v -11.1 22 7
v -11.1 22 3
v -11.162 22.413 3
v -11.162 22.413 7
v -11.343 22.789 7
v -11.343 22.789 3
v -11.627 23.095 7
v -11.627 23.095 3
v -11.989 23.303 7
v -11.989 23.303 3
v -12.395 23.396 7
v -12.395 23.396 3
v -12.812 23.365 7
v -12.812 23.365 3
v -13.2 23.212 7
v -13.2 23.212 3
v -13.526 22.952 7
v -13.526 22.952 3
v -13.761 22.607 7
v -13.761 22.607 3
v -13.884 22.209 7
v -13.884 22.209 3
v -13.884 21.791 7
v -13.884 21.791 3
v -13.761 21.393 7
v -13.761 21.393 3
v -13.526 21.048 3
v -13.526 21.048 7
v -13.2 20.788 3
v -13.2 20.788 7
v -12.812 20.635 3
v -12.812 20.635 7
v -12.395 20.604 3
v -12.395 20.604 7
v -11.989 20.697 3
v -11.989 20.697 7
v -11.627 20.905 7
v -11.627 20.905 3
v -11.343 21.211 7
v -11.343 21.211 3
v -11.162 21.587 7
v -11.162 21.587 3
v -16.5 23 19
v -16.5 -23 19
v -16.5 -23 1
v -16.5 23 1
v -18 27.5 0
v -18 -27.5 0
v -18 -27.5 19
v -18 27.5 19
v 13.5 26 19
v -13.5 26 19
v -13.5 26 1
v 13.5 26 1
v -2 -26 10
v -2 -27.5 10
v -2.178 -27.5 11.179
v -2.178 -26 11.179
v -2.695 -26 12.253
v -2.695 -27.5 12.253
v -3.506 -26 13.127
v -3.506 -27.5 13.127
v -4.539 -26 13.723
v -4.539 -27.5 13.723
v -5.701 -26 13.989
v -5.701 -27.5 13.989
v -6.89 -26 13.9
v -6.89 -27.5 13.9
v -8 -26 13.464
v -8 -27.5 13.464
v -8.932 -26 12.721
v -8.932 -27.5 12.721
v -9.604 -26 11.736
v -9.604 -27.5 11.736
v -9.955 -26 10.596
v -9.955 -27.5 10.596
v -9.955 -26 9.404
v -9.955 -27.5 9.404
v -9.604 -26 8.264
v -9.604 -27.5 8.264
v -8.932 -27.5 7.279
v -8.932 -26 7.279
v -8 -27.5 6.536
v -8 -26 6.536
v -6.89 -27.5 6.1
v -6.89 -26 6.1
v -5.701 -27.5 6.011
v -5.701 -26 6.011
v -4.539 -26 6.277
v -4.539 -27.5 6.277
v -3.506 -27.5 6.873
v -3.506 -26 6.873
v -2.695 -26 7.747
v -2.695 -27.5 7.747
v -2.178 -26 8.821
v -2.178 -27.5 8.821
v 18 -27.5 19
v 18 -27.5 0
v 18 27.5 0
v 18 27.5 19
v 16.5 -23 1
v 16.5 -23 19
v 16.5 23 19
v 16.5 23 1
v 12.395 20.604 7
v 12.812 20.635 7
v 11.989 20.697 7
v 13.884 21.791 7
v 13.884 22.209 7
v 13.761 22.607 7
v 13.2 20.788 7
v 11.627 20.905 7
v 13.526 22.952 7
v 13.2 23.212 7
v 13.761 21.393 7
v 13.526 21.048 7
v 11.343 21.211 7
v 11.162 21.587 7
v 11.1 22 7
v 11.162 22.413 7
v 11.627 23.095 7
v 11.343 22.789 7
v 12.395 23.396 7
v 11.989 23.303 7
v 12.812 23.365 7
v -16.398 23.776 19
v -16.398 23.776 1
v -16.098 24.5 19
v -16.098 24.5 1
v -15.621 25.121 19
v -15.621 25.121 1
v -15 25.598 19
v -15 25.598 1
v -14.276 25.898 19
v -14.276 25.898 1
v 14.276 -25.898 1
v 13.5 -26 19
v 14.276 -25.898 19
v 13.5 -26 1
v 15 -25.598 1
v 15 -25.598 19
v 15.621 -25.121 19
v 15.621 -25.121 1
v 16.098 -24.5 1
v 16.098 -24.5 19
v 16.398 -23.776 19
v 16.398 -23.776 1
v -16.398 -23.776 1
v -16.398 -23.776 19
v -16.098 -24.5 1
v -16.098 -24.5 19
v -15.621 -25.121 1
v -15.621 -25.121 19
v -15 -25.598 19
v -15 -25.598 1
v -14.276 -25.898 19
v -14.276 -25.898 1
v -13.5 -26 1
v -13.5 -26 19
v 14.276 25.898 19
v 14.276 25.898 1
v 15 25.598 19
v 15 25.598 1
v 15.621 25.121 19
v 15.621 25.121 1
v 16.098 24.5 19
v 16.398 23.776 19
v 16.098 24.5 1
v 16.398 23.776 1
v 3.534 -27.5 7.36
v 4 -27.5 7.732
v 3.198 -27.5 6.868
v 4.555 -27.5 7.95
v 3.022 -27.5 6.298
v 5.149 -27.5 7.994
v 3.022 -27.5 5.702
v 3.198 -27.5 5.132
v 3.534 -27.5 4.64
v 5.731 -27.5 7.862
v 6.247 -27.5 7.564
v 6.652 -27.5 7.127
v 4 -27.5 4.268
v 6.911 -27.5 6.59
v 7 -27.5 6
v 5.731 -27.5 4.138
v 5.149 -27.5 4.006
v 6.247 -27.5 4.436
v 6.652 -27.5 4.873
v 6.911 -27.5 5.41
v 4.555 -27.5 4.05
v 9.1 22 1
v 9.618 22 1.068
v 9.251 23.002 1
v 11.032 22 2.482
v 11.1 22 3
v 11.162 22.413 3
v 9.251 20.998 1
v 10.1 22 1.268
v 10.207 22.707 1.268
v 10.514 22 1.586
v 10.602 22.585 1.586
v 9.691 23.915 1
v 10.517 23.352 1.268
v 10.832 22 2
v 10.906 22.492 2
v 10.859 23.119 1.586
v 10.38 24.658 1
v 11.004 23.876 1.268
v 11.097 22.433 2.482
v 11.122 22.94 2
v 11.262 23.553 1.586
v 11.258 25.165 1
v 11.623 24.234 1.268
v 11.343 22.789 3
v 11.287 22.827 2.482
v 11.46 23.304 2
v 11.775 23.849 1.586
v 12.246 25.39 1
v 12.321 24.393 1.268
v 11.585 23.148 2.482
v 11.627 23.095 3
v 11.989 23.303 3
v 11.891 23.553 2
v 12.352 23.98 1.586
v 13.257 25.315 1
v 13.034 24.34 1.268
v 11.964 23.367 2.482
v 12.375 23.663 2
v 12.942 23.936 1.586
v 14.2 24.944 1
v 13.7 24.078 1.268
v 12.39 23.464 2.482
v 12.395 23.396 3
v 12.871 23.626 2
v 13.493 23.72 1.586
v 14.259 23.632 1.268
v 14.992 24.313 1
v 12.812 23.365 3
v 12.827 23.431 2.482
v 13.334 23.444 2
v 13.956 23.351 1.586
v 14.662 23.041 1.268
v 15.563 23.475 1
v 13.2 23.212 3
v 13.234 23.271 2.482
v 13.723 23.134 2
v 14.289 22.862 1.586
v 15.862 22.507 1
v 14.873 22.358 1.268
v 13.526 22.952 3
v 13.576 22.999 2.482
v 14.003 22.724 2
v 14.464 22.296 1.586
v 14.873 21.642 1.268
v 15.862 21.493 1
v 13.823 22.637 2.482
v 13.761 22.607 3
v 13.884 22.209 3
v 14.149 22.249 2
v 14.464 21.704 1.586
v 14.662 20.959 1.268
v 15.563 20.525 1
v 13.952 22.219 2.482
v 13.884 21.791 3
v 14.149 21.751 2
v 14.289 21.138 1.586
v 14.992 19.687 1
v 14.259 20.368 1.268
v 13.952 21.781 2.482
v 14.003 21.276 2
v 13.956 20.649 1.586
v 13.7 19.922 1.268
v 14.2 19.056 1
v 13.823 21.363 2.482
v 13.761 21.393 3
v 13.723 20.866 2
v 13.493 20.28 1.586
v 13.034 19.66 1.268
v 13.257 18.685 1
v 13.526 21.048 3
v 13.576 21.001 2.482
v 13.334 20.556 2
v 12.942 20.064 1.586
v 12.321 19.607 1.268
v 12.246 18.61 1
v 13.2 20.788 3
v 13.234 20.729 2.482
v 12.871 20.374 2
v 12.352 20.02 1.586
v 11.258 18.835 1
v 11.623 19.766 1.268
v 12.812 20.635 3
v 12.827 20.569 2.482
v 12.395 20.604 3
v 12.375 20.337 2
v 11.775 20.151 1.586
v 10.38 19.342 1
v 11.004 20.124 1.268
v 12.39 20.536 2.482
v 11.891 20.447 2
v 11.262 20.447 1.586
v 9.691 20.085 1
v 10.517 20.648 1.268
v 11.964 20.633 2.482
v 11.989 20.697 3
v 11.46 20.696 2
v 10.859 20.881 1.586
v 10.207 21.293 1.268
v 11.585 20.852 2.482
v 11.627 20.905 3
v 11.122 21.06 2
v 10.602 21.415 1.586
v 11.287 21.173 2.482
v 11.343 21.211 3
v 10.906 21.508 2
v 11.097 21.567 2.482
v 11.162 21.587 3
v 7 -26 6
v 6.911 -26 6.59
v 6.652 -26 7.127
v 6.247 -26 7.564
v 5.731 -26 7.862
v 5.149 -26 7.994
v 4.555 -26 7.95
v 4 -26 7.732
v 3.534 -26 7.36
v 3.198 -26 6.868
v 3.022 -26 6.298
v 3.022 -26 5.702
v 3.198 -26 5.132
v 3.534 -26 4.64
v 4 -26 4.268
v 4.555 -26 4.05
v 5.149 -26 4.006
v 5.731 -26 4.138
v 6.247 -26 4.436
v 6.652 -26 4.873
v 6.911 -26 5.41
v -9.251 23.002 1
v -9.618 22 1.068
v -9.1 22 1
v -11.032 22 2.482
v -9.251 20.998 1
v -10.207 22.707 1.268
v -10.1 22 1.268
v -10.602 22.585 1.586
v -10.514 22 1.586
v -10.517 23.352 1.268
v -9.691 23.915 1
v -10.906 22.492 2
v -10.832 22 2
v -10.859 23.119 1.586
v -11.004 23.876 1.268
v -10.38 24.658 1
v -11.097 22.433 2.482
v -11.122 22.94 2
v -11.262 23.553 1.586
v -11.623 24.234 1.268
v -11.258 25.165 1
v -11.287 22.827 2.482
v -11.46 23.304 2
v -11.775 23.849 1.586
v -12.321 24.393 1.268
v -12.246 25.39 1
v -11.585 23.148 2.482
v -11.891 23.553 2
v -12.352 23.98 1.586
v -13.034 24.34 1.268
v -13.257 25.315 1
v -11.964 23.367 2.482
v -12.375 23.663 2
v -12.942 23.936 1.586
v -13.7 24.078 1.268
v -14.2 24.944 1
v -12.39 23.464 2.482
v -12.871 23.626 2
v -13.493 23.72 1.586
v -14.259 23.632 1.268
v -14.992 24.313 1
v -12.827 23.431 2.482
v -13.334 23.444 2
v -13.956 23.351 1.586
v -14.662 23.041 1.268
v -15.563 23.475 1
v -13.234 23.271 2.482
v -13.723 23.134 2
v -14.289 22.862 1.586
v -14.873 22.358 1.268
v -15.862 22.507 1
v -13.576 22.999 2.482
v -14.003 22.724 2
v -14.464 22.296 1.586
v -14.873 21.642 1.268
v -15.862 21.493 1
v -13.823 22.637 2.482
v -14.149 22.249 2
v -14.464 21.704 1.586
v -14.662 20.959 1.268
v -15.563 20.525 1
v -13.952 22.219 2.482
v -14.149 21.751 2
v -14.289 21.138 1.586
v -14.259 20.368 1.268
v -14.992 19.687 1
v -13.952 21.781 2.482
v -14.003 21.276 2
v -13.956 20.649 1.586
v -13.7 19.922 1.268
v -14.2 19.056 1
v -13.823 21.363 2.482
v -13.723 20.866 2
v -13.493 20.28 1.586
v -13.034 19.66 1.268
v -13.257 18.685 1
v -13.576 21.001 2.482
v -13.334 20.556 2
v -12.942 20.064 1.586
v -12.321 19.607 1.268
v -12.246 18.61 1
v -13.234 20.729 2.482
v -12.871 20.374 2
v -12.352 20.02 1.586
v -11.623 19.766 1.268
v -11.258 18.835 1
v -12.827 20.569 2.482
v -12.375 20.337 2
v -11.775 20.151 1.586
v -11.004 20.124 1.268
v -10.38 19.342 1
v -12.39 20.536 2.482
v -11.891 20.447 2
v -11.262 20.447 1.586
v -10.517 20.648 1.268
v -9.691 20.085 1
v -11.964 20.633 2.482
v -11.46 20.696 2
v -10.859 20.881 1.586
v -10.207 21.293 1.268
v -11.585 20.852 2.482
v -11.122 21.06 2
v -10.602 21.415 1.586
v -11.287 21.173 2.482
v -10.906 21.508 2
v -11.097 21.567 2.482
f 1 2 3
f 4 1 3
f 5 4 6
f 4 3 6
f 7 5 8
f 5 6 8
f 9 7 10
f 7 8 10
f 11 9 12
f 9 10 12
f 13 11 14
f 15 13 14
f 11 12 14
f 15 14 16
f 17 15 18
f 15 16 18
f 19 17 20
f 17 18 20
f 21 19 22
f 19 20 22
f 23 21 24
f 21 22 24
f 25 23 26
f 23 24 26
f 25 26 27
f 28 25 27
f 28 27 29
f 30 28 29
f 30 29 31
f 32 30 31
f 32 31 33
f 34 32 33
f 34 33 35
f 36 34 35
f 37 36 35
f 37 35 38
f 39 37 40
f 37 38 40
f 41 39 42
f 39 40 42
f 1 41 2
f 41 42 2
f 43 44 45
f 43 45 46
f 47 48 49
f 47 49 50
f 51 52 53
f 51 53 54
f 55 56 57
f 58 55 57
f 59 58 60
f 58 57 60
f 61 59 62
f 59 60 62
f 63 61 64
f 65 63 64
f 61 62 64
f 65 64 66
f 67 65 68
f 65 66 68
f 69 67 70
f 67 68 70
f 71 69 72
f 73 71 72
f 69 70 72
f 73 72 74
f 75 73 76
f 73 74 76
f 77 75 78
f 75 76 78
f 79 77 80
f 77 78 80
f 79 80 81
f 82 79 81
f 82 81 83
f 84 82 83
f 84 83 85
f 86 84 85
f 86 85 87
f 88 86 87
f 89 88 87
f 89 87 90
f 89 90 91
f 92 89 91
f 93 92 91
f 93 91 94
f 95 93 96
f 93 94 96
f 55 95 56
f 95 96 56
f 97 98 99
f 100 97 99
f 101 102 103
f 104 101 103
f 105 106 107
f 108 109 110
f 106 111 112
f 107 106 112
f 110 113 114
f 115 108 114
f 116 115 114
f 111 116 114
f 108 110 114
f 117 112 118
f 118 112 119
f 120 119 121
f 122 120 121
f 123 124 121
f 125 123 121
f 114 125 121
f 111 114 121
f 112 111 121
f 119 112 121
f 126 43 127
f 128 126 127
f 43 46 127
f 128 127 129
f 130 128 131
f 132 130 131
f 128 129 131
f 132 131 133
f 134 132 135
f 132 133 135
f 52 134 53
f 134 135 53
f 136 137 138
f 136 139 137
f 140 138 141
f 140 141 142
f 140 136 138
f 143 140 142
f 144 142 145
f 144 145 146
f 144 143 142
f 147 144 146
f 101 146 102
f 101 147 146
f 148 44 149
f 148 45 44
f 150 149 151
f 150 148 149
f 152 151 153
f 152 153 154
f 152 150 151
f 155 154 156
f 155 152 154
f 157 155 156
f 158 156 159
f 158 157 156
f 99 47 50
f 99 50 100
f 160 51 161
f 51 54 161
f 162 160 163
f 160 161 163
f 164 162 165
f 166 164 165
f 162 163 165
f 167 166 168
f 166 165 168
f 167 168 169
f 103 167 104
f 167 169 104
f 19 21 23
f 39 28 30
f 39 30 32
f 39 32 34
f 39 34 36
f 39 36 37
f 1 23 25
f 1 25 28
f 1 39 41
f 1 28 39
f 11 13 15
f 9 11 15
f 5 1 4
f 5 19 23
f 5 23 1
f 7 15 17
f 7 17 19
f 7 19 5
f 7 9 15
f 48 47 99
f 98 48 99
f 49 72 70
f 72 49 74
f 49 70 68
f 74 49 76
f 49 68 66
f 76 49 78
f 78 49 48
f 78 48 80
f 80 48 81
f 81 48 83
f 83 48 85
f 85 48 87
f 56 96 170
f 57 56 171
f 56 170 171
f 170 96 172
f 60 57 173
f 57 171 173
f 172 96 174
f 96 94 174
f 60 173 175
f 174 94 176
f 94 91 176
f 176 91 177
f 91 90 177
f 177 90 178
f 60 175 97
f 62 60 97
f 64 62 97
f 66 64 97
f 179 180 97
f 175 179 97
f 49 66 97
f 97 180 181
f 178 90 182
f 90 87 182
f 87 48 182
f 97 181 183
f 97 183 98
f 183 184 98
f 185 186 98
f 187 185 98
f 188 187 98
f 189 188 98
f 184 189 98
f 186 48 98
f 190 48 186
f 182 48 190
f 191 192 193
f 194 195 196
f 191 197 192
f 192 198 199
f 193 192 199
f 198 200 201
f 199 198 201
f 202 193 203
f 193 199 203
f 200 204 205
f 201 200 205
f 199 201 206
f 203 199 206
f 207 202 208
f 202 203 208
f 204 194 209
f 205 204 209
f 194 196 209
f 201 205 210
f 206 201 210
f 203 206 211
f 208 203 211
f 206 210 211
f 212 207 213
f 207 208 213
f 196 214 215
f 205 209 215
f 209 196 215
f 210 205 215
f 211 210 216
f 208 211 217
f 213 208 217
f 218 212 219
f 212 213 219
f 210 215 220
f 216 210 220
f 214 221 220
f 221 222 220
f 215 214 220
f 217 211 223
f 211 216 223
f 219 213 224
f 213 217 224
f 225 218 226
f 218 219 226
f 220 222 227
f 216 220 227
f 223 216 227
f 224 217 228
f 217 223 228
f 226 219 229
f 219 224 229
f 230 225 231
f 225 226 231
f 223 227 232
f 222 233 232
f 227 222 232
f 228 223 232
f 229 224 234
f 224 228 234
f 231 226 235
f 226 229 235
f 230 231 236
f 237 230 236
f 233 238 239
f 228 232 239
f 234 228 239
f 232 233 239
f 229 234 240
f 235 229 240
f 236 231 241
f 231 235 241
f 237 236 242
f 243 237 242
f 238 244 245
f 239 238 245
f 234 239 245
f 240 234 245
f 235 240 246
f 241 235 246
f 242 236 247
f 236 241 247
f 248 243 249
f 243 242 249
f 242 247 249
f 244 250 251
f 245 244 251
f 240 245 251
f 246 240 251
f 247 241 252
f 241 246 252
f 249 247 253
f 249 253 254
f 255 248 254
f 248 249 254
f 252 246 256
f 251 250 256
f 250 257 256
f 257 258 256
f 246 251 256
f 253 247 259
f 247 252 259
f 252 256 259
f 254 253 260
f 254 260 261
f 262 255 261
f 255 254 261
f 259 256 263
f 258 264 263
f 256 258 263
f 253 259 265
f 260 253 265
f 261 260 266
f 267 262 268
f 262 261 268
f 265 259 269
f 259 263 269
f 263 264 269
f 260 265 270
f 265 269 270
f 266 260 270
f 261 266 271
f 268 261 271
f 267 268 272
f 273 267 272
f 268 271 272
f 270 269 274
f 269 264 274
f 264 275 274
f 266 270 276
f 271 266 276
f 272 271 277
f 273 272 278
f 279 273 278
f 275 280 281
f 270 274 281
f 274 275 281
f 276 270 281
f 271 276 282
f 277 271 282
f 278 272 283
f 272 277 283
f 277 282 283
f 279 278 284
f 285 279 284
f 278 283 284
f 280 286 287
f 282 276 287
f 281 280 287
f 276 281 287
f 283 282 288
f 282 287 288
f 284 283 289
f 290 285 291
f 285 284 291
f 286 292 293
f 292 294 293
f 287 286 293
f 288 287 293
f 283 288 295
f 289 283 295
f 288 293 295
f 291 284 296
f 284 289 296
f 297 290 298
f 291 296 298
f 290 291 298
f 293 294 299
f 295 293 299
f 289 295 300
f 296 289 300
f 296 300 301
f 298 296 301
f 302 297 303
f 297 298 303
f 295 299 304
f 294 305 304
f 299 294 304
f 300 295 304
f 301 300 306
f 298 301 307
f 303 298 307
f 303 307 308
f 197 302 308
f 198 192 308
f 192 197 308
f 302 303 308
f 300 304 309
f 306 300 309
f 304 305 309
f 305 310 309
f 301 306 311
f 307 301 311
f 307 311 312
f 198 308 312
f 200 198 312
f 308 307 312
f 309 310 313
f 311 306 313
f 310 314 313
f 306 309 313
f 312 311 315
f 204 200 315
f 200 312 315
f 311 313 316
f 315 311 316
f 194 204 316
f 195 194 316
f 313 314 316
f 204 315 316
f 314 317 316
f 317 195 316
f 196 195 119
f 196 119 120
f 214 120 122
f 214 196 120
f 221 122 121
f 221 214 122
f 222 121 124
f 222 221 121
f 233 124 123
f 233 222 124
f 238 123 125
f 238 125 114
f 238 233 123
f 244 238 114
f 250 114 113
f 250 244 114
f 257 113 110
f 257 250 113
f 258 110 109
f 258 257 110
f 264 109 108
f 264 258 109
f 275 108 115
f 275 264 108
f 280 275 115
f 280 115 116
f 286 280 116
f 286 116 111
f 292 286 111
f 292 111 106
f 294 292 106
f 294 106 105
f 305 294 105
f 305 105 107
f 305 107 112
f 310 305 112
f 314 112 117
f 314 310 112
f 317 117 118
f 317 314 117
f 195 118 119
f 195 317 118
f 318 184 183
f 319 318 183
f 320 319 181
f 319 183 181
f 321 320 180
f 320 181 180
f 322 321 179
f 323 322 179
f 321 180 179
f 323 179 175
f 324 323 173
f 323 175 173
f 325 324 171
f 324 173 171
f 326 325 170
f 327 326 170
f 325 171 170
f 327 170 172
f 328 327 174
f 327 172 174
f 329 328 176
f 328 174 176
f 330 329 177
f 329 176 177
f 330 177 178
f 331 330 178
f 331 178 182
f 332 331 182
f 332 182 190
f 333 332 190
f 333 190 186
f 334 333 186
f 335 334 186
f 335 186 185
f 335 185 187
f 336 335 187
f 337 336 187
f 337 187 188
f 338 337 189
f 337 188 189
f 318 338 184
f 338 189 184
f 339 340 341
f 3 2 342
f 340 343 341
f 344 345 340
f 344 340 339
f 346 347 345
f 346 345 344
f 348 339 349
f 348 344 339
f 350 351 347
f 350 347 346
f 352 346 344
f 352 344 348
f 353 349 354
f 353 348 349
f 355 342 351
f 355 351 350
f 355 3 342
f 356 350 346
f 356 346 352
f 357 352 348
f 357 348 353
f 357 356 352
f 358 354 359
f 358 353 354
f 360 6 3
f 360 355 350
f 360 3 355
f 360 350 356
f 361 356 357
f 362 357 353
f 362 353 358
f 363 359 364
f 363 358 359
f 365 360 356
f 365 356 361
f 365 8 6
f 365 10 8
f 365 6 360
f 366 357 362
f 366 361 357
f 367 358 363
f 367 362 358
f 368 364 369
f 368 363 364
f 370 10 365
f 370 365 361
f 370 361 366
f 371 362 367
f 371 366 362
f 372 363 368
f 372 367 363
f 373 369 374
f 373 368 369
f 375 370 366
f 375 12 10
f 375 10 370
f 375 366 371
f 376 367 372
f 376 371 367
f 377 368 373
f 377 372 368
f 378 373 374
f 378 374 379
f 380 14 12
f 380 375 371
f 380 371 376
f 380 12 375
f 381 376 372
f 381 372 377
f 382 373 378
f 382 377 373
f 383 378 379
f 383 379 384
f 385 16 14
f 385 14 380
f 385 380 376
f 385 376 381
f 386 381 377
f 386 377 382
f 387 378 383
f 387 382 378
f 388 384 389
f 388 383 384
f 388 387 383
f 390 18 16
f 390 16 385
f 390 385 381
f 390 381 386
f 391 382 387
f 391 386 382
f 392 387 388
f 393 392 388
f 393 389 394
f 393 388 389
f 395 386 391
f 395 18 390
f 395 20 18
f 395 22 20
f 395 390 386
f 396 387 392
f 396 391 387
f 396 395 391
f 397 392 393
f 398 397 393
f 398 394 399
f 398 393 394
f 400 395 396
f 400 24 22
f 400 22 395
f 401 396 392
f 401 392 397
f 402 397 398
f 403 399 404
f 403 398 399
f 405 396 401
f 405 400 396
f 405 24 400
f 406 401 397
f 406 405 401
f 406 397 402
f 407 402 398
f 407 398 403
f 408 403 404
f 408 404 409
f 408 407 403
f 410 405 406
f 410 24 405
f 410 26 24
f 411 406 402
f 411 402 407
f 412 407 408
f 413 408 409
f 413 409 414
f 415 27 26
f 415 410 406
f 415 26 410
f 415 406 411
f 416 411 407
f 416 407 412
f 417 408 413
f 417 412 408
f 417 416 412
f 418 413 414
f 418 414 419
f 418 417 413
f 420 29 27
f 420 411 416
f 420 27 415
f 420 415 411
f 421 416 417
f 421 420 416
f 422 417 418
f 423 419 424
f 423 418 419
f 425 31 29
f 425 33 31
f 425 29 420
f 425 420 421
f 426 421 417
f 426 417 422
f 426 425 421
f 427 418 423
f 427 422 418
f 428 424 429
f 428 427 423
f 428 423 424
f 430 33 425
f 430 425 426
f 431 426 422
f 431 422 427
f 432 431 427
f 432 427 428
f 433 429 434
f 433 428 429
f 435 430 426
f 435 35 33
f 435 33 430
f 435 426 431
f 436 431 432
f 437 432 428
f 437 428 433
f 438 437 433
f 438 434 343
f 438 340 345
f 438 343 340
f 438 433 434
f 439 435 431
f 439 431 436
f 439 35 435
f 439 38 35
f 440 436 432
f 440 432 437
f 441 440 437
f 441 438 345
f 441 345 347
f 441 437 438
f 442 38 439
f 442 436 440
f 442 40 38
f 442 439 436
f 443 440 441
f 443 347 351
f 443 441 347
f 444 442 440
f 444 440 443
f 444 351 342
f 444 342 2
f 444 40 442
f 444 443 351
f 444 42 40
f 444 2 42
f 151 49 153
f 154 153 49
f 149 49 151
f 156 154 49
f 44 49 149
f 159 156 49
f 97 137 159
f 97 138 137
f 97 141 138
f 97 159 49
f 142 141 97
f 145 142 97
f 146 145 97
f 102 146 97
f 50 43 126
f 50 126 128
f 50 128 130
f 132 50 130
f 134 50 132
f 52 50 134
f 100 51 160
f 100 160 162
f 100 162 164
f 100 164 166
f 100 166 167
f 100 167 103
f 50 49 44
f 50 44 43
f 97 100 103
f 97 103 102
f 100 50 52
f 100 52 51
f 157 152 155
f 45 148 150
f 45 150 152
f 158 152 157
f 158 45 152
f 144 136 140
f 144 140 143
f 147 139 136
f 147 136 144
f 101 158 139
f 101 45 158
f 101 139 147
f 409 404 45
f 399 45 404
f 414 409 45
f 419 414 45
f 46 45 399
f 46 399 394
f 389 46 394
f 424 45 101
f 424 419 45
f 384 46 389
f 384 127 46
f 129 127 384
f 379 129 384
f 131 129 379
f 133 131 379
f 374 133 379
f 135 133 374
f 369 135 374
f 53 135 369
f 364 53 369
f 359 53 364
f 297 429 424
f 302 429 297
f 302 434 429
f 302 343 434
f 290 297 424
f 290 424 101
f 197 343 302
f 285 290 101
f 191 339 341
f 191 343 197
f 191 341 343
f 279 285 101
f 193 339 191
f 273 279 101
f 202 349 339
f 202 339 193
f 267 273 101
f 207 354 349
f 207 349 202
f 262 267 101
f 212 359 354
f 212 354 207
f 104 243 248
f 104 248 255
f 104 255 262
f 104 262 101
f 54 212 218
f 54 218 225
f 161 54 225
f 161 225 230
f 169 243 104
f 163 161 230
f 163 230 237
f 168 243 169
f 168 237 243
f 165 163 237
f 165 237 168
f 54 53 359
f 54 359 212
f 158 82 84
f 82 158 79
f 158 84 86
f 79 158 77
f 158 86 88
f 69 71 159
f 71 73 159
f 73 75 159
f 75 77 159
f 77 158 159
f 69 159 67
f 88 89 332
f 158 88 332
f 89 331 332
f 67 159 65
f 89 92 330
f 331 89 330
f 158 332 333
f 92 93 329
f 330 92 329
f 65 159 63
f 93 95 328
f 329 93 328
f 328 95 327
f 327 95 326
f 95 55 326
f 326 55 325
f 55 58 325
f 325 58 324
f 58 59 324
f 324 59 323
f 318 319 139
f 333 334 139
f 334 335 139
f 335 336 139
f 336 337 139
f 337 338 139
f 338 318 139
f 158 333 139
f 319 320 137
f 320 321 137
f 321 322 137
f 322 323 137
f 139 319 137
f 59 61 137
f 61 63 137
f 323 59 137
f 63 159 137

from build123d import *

# Parameters (mm, degrees)
SKETCH_W        = 36
SKETCH_H        = 55
PAD_DEPTH       = 19
SKETCH001_W     = 33
SKETCH001_H     = 52
POCKET_DEPTH    = 18
SKETCH002_R     = 1.4
PAD001_DEPTH    = 6
SKETCH003_R     = 4
SKETCH003_R_2   = 2
POCKET001_DEPTH = 1.5
FILLET_R        = 2
FILLET001_R     = 3


with BuildPart() as part:
    # Sketch → Pad (new body)
    with BuildSketch(Plane.XY):
        Rectangle(SKETCH_W, SKETCH_H)
    extrude(amount=PAD_DEPTH)

    # Sketch001 (on Face6 of Pad) → Pocket (cut)
    with BuildSketch(Plane.XY.offset(19)):
        Rectangle(SKETCH001_W, SKETCH001_H)
    extrude(amount=-POCKET_DEPTH, mode=Mode.SUBTRACT)

    # Sketch002 (on Face11 of Pocket) → Pad001 (join)
    with BuildSketch(Plane.XY.offset(1)):
        with Locations((-12.5, 22)):
            Circle(SKETCH002_R)
    pad001 = extrude(amount=PAD001_DEPTH)

    # Mirrored: Pad001 across Sketch002 V_Axis
    add(pad001.mirror(Plane(origin=(0, 0, 1), x_dir=(0, 0, 1), z_dir=(1, 0, 0))))

    # Sketch003 (on Face6 of Mirrored) → Pocket001 (cut)
    with BuildSketch(Plane.XZ.offset(27.5)):
        with Locations((-6, 10)):
            Circle(SKETCH003_R)
        with Locations((5, 6)):
            Circle(SKETCH003_R_2)
    extrude(amount=-POCKET001_DEPTH, mode=Mode.SUBTRACT)

    # Fillet
    fillet_edges = [part.edges().sort_by_distance(p)[0] for p in [
        (-13.9, 22, 1),
        (13.9, 22, 1),
    ]]
    fillet(fillet_edges, radius=FILLET_R)

    # Fillet001
    fillet001_edges = [part.edges().sort_by_distance(p)[0] for p in [
        (-16.5, 26, 10),
        (-16.5, -26, 10),
        (16.5, -26, 10),
        (16.5, 26, 10),
    ]]
    fillet(fillet001_edges, radius=FILLET001_R)


solid = part.part
